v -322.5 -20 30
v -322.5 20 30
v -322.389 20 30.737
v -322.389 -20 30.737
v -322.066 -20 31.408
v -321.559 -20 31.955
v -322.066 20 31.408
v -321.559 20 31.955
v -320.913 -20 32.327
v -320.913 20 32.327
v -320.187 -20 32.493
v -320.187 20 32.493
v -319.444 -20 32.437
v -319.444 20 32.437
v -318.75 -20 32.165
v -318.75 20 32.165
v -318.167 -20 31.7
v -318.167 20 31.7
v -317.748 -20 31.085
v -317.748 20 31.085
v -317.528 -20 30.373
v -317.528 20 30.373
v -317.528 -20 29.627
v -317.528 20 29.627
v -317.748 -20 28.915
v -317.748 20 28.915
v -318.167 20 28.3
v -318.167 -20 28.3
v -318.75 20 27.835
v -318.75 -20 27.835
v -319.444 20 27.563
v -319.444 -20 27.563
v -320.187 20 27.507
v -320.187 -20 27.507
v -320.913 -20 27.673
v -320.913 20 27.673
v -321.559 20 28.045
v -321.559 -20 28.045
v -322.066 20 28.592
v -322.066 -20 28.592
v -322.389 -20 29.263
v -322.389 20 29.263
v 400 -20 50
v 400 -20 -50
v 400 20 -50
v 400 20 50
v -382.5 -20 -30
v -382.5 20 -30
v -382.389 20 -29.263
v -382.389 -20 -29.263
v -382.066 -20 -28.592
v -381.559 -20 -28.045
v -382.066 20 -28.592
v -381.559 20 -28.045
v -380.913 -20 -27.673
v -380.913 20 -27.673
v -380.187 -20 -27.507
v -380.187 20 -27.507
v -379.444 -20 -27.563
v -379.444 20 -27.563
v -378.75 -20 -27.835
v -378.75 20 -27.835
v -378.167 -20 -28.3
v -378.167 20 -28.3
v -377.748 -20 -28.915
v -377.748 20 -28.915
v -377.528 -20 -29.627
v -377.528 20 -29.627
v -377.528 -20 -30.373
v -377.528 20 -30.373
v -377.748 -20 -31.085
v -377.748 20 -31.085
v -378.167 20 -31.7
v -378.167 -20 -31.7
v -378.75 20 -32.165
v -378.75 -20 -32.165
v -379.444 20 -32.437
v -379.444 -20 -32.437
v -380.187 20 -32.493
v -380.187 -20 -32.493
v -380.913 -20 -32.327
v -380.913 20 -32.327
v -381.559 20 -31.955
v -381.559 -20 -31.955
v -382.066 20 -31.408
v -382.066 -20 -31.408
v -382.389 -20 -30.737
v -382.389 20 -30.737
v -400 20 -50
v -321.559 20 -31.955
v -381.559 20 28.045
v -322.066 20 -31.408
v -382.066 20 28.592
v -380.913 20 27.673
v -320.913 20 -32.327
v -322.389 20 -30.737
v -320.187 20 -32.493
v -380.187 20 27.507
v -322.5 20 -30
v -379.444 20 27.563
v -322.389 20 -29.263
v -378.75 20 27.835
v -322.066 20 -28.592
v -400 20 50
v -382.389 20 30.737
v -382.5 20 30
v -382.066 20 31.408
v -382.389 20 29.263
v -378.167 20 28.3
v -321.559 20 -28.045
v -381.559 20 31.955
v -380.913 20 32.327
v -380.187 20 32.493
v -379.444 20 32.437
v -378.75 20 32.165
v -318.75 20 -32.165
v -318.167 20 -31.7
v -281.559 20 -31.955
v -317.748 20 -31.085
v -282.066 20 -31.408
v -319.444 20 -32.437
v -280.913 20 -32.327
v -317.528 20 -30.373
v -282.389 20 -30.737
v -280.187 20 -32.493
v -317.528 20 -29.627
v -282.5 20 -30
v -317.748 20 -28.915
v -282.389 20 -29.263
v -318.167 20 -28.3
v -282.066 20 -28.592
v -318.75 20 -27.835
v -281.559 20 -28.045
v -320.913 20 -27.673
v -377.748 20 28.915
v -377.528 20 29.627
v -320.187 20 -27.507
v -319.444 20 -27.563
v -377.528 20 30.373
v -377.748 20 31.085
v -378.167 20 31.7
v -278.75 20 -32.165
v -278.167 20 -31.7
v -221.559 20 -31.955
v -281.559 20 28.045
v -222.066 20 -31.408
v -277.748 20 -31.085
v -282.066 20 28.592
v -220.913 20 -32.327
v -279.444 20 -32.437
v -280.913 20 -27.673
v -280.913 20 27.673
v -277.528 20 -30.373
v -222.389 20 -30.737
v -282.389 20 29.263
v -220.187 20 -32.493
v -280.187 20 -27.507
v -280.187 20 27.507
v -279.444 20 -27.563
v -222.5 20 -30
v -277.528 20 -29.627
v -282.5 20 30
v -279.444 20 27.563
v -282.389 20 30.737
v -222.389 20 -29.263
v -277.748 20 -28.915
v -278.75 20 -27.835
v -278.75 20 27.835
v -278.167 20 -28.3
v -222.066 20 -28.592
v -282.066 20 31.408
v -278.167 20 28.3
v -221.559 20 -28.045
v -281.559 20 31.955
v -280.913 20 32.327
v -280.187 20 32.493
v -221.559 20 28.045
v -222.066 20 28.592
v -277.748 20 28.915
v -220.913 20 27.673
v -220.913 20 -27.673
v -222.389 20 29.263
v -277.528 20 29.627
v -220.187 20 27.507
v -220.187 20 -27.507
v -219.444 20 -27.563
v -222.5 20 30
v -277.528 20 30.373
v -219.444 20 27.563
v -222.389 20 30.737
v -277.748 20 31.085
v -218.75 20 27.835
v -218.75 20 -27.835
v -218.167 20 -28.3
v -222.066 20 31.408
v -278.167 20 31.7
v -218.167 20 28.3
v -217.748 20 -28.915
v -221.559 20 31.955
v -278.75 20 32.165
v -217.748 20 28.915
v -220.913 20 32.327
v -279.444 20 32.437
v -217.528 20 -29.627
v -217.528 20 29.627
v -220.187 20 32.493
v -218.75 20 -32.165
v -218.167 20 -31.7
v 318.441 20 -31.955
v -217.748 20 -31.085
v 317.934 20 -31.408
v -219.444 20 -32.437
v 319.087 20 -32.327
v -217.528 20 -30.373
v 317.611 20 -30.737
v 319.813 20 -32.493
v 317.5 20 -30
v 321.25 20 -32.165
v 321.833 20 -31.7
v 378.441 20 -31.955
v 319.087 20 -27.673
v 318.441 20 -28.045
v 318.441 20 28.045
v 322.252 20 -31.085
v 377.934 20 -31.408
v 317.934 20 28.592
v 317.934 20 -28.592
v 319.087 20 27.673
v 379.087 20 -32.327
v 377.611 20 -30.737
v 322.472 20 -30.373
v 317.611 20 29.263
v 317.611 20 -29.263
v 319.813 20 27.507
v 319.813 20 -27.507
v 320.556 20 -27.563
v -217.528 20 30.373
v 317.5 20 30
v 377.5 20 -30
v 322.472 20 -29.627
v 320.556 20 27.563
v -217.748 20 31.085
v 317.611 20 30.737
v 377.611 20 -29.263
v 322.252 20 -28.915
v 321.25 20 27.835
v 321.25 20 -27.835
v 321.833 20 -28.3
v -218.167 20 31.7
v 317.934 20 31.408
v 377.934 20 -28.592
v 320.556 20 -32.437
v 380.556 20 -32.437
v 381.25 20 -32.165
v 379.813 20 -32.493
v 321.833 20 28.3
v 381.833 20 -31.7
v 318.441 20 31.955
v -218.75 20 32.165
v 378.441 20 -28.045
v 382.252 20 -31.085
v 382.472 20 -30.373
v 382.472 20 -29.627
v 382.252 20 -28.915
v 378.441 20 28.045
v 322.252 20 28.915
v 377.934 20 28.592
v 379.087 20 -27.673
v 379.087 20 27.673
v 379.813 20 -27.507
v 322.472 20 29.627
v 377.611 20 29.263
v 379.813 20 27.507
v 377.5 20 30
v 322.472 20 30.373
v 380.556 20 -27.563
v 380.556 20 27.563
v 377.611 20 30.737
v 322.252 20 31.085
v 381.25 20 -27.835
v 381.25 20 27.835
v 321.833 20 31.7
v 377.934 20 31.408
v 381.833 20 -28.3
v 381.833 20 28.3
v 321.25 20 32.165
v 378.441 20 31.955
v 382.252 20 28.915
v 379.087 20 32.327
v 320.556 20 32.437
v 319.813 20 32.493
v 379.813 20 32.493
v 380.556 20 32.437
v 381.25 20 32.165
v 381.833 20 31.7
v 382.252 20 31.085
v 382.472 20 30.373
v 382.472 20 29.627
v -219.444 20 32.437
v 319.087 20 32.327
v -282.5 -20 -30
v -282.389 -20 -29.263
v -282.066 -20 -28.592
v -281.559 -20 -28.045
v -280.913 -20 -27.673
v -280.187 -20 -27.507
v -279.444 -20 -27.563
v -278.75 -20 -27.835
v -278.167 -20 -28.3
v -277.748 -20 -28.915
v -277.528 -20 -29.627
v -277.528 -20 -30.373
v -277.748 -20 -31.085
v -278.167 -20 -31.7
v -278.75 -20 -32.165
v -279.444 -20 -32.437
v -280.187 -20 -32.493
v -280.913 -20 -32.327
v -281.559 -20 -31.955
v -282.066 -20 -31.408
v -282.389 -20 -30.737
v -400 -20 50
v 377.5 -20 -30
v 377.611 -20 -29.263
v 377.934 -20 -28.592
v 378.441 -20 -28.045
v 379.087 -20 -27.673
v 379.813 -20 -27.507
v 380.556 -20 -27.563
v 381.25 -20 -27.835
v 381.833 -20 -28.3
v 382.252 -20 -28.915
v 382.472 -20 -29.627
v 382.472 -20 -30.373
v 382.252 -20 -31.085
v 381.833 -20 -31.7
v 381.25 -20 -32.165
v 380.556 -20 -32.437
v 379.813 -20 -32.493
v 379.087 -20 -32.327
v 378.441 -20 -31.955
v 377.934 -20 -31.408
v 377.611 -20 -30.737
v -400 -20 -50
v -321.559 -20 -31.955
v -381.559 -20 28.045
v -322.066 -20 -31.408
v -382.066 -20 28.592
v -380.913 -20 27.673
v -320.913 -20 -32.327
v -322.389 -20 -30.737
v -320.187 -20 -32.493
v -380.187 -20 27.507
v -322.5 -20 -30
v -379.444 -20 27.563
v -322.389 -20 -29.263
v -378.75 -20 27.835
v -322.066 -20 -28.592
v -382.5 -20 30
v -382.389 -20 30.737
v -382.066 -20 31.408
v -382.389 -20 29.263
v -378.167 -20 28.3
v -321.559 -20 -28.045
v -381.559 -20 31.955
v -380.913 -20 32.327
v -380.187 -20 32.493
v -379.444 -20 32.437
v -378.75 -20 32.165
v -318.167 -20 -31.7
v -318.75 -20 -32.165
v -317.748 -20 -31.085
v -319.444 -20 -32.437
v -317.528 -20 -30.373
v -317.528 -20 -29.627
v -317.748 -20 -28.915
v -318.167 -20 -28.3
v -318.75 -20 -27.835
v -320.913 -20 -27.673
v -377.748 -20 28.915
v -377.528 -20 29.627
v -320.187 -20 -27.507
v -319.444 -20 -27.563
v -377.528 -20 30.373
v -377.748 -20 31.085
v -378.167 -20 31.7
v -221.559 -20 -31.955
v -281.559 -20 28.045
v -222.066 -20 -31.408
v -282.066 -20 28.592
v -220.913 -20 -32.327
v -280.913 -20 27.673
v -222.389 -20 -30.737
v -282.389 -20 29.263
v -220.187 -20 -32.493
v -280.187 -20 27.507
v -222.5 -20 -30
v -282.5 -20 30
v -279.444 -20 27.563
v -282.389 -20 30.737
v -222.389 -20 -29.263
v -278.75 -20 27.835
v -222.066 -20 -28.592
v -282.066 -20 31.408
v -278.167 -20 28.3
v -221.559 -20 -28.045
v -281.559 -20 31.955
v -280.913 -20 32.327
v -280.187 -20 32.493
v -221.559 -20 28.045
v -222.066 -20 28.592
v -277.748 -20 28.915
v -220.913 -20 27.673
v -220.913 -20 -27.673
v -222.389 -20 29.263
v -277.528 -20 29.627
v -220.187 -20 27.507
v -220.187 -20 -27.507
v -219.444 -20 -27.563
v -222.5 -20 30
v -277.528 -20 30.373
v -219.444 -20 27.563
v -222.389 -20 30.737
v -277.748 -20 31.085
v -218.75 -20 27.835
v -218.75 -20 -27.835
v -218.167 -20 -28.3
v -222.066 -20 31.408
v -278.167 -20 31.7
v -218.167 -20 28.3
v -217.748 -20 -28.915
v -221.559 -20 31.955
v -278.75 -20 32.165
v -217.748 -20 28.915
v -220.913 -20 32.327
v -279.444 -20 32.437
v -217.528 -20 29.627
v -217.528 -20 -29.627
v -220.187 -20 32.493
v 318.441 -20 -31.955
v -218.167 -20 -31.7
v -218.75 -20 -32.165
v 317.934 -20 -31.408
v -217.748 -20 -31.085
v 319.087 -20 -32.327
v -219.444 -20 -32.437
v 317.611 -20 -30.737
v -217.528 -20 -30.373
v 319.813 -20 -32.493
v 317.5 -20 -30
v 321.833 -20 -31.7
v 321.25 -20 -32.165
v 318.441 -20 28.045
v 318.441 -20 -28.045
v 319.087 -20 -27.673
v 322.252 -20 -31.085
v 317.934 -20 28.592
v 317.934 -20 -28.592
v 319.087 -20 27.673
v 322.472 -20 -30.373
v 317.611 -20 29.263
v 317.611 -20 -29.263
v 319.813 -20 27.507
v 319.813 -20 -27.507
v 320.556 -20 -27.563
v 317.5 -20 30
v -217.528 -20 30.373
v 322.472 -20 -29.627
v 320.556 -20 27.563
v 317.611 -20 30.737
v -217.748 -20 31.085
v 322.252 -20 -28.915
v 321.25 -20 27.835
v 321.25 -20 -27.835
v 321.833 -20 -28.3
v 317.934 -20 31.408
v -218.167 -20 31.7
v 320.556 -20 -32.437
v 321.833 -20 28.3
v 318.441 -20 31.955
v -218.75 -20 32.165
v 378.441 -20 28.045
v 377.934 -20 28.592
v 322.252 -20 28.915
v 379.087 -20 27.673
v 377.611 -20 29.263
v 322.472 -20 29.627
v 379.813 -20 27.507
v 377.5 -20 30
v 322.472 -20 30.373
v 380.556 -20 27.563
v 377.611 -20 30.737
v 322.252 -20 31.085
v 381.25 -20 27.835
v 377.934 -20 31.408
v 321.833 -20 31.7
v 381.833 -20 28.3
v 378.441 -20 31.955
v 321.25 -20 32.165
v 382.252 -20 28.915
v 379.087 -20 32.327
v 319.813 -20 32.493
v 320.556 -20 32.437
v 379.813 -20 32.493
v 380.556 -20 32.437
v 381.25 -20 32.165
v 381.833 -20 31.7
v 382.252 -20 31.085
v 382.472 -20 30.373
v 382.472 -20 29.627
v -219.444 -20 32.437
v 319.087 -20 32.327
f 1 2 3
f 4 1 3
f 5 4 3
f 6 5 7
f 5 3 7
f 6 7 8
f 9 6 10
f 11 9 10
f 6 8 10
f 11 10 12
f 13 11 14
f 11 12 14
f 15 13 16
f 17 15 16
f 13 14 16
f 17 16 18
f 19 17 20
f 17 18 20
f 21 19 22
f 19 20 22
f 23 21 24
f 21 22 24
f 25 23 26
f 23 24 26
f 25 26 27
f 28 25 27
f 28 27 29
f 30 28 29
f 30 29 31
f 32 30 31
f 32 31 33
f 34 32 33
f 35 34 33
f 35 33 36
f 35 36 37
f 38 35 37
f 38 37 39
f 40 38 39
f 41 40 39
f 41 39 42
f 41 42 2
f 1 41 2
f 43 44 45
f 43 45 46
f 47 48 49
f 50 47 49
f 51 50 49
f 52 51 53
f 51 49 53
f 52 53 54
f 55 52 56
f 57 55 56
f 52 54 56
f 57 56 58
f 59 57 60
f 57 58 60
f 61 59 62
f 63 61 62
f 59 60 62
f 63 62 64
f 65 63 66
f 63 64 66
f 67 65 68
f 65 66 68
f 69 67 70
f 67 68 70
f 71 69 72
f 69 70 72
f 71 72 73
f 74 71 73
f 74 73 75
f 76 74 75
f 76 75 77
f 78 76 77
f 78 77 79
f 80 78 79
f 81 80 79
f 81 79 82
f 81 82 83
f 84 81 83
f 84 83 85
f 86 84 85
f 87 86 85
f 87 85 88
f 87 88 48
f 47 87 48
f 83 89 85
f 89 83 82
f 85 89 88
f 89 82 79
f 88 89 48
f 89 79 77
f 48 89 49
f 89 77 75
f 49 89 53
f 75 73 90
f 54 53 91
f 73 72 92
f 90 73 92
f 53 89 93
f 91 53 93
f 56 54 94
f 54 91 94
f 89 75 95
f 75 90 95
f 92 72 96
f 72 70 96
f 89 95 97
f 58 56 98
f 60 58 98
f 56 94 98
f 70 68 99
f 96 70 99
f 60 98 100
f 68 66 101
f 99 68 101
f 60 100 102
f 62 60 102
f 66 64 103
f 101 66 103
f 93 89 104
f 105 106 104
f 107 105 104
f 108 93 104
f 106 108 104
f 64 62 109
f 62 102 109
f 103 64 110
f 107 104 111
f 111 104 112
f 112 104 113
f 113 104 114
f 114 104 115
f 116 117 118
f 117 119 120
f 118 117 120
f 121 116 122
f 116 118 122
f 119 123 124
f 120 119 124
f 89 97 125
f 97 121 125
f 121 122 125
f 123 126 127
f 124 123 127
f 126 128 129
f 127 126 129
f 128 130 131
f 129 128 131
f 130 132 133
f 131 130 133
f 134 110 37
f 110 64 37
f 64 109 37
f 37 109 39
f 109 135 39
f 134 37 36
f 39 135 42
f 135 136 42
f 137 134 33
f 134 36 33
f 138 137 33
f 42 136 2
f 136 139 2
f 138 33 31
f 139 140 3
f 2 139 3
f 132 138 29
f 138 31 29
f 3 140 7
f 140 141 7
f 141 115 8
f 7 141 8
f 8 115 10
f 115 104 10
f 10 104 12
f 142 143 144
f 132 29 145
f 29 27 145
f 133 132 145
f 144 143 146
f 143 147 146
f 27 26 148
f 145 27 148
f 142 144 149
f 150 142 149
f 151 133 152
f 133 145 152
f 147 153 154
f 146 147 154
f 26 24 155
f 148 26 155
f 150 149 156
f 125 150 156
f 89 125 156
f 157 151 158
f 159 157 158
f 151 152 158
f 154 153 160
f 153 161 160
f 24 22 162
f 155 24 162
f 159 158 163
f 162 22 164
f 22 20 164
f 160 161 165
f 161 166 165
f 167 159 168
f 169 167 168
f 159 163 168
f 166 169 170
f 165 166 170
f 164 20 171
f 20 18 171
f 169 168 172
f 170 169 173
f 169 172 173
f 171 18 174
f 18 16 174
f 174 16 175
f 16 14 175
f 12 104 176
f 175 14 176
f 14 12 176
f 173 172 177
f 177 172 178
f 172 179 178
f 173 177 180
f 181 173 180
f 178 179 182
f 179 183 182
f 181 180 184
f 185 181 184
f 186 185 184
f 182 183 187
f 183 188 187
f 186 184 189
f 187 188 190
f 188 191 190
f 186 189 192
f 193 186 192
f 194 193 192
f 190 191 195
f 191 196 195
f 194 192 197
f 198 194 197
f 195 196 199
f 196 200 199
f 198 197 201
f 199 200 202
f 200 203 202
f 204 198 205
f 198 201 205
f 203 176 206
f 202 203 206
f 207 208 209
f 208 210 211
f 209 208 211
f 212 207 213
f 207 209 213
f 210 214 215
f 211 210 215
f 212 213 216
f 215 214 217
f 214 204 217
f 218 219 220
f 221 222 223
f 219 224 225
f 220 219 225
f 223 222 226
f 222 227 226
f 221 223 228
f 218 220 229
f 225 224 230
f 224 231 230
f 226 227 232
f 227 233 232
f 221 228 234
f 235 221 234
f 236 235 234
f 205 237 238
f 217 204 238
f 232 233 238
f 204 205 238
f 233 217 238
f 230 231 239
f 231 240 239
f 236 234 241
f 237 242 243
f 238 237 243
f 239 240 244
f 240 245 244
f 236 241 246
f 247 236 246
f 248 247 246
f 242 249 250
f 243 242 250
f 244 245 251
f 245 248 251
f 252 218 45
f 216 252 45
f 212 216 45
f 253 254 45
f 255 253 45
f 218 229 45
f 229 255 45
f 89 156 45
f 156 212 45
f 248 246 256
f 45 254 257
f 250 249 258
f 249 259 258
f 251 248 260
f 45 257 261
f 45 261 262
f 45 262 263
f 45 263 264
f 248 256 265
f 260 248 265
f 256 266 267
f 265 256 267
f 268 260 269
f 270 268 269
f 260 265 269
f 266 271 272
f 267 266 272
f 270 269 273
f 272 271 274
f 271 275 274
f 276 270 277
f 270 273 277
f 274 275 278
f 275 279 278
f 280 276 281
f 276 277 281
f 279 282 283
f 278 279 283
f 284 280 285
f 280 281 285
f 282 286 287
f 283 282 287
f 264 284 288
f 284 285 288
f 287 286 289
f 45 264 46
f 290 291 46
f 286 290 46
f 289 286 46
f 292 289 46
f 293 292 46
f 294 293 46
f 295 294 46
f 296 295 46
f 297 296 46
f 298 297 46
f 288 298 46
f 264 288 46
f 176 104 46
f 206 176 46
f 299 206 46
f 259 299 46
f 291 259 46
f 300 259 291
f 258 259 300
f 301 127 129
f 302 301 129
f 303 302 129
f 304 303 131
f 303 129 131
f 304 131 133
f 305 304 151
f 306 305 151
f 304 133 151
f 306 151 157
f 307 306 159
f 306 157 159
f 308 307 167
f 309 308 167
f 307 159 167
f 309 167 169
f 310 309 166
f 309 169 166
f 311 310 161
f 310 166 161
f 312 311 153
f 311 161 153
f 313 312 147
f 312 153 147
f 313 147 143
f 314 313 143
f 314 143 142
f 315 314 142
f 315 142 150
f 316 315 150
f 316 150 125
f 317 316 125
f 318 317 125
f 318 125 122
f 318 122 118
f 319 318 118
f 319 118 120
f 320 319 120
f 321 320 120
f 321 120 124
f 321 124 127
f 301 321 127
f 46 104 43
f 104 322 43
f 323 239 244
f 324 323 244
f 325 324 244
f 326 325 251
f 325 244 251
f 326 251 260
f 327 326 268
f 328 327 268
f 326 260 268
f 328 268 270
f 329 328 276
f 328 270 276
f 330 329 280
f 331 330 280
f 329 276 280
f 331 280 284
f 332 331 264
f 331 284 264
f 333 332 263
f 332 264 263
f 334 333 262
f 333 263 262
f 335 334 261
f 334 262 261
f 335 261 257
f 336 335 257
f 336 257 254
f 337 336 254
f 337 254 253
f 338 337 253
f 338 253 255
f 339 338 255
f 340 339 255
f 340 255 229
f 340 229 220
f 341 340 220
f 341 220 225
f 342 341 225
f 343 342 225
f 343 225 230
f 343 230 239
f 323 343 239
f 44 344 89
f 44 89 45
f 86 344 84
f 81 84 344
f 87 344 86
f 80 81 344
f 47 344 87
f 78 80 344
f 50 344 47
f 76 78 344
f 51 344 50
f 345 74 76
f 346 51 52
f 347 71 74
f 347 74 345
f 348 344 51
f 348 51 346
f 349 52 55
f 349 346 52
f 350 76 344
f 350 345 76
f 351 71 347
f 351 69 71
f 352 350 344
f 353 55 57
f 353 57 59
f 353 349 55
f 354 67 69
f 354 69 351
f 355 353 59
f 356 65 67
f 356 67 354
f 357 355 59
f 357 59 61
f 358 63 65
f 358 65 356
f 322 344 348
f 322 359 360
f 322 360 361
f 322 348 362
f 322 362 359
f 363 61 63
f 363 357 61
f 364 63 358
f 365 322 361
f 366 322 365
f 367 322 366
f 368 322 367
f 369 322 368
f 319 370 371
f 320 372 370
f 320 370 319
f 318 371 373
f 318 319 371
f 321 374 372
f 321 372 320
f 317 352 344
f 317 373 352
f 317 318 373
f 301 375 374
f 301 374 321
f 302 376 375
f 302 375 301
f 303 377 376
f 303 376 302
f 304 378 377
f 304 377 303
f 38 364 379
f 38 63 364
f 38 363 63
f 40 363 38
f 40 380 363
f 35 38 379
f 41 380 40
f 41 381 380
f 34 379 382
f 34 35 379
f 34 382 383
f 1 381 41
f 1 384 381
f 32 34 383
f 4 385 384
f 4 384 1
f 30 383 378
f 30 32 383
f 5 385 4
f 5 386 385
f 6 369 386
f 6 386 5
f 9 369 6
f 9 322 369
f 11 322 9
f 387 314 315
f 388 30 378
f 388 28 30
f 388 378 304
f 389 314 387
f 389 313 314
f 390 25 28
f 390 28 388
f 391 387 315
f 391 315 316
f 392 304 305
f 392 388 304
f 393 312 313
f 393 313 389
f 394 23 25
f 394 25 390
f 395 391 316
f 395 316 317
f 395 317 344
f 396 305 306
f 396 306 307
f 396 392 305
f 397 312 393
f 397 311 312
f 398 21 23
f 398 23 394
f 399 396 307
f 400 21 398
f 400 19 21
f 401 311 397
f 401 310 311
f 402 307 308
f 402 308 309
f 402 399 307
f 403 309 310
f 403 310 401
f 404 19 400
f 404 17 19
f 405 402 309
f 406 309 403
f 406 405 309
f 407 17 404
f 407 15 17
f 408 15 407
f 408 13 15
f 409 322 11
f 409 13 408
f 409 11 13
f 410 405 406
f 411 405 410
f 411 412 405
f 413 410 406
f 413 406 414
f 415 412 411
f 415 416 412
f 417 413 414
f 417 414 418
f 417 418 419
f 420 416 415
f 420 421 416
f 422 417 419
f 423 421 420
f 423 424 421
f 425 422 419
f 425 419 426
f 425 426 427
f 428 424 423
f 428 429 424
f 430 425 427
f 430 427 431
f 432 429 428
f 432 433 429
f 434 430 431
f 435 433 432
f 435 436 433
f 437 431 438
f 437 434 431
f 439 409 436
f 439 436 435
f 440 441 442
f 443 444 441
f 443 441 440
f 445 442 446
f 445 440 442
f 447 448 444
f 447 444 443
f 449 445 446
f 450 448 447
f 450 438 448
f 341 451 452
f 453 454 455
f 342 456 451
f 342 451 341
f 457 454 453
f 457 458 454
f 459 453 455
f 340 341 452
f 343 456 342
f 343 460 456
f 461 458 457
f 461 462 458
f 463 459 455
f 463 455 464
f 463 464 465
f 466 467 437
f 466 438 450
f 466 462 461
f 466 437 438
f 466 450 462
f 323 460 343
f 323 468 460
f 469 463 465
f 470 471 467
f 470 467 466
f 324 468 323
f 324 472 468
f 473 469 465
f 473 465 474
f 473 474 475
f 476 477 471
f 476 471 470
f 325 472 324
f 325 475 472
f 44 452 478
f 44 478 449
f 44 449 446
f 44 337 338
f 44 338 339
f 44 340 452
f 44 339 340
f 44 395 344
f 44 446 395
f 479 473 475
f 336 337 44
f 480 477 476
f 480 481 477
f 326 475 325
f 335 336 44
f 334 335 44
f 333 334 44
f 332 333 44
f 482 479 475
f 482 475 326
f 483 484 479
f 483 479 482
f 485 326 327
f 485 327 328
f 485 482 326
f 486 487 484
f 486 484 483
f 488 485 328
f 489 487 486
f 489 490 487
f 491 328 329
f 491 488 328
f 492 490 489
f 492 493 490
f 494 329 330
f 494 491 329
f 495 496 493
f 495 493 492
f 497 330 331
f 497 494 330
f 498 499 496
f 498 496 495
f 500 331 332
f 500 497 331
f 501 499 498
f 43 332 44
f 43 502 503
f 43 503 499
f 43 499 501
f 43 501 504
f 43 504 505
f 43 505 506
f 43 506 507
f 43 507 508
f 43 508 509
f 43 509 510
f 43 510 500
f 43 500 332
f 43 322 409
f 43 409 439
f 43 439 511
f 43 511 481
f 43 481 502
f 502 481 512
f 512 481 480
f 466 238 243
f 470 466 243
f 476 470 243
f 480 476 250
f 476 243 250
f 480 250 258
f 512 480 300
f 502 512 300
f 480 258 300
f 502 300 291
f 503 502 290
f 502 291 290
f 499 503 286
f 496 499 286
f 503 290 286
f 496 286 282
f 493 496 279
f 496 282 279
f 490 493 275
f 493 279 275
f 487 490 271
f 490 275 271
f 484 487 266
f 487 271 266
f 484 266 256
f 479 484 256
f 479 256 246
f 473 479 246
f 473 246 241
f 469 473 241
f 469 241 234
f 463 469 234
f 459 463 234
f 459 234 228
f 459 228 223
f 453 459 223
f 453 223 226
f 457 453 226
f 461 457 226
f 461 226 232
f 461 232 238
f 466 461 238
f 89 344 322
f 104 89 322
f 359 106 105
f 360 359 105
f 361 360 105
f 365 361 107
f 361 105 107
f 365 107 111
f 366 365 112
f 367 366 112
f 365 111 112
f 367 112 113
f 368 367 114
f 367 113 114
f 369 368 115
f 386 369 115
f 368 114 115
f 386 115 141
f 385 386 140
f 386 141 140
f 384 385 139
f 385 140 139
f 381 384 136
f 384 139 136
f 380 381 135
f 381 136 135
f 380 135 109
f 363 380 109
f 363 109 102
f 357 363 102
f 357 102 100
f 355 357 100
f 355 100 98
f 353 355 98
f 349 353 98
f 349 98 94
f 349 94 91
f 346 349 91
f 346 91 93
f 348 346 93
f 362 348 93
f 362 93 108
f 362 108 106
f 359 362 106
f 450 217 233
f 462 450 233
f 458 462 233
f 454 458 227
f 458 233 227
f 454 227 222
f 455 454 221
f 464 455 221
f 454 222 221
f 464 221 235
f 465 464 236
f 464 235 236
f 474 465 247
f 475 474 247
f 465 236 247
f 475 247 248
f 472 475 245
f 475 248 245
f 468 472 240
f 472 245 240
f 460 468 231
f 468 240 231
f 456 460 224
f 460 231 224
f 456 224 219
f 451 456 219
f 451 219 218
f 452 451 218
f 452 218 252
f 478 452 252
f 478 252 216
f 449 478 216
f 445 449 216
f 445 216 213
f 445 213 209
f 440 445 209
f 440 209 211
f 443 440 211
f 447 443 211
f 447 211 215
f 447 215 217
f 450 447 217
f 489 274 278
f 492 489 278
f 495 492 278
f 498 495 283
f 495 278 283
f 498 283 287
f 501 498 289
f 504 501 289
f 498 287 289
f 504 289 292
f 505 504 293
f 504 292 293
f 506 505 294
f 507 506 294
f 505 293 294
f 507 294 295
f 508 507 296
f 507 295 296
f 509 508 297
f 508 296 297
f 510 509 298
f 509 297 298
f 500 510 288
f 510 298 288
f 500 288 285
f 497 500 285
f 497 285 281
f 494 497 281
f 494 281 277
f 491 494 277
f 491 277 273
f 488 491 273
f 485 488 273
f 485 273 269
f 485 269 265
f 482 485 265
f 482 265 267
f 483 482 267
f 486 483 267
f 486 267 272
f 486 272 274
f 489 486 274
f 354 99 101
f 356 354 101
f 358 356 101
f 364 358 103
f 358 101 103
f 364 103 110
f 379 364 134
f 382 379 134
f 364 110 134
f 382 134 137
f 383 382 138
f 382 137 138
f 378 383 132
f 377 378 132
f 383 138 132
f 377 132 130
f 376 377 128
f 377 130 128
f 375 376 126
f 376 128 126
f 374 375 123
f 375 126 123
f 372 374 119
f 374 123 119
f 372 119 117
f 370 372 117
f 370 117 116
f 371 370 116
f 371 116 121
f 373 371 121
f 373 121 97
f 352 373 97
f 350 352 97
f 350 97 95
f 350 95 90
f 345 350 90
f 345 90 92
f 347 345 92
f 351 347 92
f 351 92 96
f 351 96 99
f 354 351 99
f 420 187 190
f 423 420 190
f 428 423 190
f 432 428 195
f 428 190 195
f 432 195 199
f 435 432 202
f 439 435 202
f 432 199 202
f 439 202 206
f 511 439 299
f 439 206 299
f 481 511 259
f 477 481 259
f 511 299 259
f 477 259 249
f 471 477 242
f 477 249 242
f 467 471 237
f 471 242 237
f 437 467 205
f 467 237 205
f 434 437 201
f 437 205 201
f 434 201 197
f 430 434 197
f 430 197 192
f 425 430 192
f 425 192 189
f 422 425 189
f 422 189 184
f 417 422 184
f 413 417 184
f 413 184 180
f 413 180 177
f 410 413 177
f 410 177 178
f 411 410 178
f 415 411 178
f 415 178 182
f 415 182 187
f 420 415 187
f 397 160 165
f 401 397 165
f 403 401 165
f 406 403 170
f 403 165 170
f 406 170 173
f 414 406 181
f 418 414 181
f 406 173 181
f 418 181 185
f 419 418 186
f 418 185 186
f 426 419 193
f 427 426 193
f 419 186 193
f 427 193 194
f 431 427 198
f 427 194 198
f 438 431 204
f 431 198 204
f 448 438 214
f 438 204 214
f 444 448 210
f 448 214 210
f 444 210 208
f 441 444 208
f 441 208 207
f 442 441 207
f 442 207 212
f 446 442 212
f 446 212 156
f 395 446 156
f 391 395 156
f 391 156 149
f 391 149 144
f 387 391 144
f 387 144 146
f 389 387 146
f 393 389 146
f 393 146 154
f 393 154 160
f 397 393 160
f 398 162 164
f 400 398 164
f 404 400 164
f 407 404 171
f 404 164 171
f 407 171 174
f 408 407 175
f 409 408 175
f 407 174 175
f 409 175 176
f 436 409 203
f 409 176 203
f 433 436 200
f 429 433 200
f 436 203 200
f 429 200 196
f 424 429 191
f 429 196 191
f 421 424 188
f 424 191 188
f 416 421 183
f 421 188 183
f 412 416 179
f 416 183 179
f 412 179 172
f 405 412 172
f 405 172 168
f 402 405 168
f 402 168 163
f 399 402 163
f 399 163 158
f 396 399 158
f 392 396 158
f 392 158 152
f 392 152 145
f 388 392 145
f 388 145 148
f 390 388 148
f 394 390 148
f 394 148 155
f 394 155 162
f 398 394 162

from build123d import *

# Parameters (mm, degrees)
F0_W     = 800
F0_H     = 100
F1_DEPTH = 20
F3_D     = 5


with BuildPart() as f1:
    # F0 (on Front) → F1 (new body, symmetric)
    with BuildSketch(Plane.XZ):
        Rectangle(F0_W, F0_H)
    extrude(amount=F1_DEPTH, both=True)

    # F3 (through all)
    with Locations(Plane.XZ.offset(20)):
        with Locations((-380, 30), (-380, -30), (-320, 30), (-320, -30), (-280, 30), (-280, -30), (-220, -30), (-220, 30), (380, 30), (320, 30), (320, -30), (380, -30)):
            Hole(F3_D / 2)


solid = f1.part
